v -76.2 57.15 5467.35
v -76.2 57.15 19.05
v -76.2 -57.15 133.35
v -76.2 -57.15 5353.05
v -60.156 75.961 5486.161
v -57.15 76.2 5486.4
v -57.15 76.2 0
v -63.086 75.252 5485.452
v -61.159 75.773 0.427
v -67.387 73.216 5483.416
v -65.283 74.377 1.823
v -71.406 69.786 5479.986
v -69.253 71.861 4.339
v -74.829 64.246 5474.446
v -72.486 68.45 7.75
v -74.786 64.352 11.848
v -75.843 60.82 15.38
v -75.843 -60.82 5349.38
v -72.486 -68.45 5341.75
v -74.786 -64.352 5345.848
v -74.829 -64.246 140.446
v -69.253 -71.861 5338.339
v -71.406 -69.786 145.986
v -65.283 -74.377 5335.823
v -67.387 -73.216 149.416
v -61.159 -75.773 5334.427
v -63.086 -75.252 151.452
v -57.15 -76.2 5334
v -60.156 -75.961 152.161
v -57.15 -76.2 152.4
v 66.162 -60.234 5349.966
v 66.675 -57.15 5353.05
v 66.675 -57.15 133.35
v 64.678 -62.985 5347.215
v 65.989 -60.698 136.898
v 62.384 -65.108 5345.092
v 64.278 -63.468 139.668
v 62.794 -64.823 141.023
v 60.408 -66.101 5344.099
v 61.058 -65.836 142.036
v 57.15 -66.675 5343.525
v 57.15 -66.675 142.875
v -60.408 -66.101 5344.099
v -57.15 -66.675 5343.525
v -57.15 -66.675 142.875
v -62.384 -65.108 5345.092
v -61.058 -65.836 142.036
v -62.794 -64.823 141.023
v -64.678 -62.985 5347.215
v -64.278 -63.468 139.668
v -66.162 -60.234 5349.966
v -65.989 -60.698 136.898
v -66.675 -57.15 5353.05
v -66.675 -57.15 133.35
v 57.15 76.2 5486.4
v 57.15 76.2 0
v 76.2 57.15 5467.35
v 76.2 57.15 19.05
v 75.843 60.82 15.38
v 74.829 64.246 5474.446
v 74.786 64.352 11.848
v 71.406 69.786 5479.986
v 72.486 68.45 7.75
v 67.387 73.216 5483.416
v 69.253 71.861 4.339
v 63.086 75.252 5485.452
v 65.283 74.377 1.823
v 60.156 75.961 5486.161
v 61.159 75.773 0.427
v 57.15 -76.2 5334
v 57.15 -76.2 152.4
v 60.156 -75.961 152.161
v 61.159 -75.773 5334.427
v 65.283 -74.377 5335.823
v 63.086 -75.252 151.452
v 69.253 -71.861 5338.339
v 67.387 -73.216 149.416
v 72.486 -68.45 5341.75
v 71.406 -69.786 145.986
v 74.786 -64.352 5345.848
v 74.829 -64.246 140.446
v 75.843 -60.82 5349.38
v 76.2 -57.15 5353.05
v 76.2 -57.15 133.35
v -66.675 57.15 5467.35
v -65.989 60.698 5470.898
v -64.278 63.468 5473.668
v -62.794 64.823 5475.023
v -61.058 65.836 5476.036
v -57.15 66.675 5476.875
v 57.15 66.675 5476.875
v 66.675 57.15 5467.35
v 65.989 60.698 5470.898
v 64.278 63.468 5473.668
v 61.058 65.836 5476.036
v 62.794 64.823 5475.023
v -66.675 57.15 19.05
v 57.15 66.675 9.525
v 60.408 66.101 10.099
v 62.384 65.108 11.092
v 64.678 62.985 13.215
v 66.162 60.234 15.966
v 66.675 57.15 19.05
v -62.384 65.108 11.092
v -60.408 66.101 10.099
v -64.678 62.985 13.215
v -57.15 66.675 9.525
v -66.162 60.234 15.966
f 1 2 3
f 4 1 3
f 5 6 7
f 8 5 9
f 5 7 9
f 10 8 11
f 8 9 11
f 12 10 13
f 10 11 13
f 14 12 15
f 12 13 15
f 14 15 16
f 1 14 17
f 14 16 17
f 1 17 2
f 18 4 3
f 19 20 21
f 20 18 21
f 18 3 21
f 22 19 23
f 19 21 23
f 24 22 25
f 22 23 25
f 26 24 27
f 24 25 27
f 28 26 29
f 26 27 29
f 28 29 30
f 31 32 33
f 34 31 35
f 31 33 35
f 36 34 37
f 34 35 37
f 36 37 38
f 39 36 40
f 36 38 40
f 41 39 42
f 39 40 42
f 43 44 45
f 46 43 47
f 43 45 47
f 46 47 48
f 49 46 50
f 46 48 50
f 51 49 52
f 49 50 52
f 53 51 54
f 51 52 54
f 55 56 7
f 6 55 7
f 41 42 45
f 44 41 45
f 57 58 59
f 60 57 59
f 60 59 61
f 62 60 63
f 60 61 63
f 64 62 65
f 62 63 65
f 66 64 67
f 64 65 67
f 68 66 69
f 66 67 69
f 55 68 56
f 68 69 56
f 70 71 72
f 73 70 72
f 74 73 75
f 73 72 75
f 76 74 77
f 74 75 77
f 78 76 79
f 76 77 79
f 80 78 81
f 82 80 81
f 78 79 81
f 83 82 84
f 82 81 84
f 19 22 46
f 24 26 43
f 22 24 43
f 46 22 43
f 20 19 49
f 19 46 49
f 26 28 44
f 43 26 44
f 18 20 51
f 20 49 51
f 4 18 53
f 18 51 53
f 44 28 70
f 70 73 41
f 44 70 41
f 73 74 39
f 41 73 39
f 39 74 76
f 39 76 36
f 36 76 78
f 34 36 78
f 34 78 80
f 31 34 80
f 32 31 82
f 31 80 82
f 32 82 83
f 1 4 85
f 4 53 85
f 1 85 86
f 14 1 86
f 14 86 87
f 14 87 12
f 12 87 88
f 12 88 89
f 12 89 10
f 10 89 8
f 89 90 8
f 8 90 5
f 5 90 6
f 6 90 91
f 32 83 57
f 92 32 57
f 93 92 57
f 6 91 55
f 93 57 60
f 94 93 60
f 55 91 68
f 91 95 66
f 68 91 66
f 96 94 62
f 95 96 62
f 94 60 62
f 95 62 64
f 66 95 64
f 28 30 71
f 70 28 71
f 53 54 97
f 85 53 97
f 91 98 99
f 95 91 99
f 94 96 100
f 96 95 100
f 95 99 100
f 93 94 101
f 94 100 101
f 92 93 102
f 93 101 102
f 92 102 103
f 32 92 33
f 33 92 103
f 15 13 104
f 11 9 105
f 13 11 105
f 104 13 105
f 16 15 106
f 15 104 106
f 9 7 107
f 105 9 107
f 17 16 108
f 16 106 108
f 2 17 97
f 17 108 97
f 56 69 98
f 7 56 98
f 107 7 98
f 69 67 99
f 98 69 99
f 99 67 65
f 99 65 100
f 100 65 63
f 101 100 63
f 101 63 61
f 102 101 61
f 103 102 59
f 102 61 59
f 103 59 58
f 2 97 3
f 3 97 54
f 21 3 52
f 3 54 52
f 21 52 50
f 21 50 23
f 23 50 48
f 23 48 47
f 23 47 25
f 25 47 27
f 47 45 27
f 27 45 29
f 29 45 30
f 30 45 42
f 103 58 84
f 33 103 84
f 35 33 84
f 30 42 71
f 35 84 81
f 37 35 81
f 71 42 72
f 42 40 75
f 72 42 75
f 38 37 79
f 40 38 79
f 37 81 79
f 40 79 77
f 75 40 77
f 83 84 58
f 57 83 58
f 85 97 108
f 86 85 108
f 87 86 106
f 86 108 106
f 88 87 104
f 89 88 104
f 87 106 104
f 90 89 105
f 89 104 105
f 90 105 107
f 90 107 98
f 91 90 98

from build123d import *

# Parameters (mm, degrees)
F1_DEPTH      = 5486.4
F3_DEPTH      = 76.201
F3_DEPTH_BACK = 76.201


with BuildPart() as f1:
    # F0 (on Top) → F1 (new body)
    with BuildSketch(Plane.XY):
        with BuildLine():
            ThreePointArc((-76.2, -57.15), (-70.6203841816, -70.6203841816), (-57.15, -76.2))
            Line((-57.15, -76.2), (57.15, -76.2))
            ThreePointArc((57.15, -76.2), (70.6203841816, -70.6203841816), (76.2, -57.15))
            Line((76.2, -57.15), (76.2, 57.15))
            ThreePointArc((76.2, 57.15), (70.6203841816, 70.6203841816), (57.15, 76.2))
            Line((57.15, 76.2), (-57.15, 76.2))
            ThreePointArc((-57.15, 76.2), (-70.6203841816, 70.6203841816), (-76.2, 57.15))
            Line((-76.2, 57.15), (-76.2, -57.15))
        make_face()
        with BuildLine():
            Line((57.15, -66.675), (-57.15, -66.675))
            ThreePointArc((-57.15, -66.675), (-63.8851920908, -63.8851920908), (-66.675, -57.15))
            Line((-66.675, -57.15), (-66.675, 57.15))
            ThreePointArc((-66.675, 57.15), (-63.8851920908, 63.8851920908), (-57.15, 66.675))
            Line((-57.15, 66.675), (57.15, 66.675))
            ThreePointArc((57.15, 66.675), (63.8851920908, 63.8851920908), (66.675, 57.15))
            Line((66.675, 57.15), (66.675, -57.15))
            ThreePointArc((66.675, -57.15), (63.8851920908, -63.8851920908), (57.15, -66.675))
        make_face(mode=Mode.SUBTRACT)
    extrude(amount=F1_DEPTH)

    # F2 (on Right) → F3 (cut, two sides)
    with BuildSketch(Plane.YZ) as f3_sk:
        Polygon((76.2, 5486.4), (-76.2, 5486.4), (-76.2, 5334), align=None)
        Polygon((-76.2, 0), (76.2, 0), (-76.2, 152.4), align=None)
    extrude(amount=-F3_DEPTH, mode=Mode.SUBTRACT)
    extrude(f3_sk.sketch, amount=F3_DEPTH_BACK, mode=Mode.SUBTRACT)


solid = f1.part
